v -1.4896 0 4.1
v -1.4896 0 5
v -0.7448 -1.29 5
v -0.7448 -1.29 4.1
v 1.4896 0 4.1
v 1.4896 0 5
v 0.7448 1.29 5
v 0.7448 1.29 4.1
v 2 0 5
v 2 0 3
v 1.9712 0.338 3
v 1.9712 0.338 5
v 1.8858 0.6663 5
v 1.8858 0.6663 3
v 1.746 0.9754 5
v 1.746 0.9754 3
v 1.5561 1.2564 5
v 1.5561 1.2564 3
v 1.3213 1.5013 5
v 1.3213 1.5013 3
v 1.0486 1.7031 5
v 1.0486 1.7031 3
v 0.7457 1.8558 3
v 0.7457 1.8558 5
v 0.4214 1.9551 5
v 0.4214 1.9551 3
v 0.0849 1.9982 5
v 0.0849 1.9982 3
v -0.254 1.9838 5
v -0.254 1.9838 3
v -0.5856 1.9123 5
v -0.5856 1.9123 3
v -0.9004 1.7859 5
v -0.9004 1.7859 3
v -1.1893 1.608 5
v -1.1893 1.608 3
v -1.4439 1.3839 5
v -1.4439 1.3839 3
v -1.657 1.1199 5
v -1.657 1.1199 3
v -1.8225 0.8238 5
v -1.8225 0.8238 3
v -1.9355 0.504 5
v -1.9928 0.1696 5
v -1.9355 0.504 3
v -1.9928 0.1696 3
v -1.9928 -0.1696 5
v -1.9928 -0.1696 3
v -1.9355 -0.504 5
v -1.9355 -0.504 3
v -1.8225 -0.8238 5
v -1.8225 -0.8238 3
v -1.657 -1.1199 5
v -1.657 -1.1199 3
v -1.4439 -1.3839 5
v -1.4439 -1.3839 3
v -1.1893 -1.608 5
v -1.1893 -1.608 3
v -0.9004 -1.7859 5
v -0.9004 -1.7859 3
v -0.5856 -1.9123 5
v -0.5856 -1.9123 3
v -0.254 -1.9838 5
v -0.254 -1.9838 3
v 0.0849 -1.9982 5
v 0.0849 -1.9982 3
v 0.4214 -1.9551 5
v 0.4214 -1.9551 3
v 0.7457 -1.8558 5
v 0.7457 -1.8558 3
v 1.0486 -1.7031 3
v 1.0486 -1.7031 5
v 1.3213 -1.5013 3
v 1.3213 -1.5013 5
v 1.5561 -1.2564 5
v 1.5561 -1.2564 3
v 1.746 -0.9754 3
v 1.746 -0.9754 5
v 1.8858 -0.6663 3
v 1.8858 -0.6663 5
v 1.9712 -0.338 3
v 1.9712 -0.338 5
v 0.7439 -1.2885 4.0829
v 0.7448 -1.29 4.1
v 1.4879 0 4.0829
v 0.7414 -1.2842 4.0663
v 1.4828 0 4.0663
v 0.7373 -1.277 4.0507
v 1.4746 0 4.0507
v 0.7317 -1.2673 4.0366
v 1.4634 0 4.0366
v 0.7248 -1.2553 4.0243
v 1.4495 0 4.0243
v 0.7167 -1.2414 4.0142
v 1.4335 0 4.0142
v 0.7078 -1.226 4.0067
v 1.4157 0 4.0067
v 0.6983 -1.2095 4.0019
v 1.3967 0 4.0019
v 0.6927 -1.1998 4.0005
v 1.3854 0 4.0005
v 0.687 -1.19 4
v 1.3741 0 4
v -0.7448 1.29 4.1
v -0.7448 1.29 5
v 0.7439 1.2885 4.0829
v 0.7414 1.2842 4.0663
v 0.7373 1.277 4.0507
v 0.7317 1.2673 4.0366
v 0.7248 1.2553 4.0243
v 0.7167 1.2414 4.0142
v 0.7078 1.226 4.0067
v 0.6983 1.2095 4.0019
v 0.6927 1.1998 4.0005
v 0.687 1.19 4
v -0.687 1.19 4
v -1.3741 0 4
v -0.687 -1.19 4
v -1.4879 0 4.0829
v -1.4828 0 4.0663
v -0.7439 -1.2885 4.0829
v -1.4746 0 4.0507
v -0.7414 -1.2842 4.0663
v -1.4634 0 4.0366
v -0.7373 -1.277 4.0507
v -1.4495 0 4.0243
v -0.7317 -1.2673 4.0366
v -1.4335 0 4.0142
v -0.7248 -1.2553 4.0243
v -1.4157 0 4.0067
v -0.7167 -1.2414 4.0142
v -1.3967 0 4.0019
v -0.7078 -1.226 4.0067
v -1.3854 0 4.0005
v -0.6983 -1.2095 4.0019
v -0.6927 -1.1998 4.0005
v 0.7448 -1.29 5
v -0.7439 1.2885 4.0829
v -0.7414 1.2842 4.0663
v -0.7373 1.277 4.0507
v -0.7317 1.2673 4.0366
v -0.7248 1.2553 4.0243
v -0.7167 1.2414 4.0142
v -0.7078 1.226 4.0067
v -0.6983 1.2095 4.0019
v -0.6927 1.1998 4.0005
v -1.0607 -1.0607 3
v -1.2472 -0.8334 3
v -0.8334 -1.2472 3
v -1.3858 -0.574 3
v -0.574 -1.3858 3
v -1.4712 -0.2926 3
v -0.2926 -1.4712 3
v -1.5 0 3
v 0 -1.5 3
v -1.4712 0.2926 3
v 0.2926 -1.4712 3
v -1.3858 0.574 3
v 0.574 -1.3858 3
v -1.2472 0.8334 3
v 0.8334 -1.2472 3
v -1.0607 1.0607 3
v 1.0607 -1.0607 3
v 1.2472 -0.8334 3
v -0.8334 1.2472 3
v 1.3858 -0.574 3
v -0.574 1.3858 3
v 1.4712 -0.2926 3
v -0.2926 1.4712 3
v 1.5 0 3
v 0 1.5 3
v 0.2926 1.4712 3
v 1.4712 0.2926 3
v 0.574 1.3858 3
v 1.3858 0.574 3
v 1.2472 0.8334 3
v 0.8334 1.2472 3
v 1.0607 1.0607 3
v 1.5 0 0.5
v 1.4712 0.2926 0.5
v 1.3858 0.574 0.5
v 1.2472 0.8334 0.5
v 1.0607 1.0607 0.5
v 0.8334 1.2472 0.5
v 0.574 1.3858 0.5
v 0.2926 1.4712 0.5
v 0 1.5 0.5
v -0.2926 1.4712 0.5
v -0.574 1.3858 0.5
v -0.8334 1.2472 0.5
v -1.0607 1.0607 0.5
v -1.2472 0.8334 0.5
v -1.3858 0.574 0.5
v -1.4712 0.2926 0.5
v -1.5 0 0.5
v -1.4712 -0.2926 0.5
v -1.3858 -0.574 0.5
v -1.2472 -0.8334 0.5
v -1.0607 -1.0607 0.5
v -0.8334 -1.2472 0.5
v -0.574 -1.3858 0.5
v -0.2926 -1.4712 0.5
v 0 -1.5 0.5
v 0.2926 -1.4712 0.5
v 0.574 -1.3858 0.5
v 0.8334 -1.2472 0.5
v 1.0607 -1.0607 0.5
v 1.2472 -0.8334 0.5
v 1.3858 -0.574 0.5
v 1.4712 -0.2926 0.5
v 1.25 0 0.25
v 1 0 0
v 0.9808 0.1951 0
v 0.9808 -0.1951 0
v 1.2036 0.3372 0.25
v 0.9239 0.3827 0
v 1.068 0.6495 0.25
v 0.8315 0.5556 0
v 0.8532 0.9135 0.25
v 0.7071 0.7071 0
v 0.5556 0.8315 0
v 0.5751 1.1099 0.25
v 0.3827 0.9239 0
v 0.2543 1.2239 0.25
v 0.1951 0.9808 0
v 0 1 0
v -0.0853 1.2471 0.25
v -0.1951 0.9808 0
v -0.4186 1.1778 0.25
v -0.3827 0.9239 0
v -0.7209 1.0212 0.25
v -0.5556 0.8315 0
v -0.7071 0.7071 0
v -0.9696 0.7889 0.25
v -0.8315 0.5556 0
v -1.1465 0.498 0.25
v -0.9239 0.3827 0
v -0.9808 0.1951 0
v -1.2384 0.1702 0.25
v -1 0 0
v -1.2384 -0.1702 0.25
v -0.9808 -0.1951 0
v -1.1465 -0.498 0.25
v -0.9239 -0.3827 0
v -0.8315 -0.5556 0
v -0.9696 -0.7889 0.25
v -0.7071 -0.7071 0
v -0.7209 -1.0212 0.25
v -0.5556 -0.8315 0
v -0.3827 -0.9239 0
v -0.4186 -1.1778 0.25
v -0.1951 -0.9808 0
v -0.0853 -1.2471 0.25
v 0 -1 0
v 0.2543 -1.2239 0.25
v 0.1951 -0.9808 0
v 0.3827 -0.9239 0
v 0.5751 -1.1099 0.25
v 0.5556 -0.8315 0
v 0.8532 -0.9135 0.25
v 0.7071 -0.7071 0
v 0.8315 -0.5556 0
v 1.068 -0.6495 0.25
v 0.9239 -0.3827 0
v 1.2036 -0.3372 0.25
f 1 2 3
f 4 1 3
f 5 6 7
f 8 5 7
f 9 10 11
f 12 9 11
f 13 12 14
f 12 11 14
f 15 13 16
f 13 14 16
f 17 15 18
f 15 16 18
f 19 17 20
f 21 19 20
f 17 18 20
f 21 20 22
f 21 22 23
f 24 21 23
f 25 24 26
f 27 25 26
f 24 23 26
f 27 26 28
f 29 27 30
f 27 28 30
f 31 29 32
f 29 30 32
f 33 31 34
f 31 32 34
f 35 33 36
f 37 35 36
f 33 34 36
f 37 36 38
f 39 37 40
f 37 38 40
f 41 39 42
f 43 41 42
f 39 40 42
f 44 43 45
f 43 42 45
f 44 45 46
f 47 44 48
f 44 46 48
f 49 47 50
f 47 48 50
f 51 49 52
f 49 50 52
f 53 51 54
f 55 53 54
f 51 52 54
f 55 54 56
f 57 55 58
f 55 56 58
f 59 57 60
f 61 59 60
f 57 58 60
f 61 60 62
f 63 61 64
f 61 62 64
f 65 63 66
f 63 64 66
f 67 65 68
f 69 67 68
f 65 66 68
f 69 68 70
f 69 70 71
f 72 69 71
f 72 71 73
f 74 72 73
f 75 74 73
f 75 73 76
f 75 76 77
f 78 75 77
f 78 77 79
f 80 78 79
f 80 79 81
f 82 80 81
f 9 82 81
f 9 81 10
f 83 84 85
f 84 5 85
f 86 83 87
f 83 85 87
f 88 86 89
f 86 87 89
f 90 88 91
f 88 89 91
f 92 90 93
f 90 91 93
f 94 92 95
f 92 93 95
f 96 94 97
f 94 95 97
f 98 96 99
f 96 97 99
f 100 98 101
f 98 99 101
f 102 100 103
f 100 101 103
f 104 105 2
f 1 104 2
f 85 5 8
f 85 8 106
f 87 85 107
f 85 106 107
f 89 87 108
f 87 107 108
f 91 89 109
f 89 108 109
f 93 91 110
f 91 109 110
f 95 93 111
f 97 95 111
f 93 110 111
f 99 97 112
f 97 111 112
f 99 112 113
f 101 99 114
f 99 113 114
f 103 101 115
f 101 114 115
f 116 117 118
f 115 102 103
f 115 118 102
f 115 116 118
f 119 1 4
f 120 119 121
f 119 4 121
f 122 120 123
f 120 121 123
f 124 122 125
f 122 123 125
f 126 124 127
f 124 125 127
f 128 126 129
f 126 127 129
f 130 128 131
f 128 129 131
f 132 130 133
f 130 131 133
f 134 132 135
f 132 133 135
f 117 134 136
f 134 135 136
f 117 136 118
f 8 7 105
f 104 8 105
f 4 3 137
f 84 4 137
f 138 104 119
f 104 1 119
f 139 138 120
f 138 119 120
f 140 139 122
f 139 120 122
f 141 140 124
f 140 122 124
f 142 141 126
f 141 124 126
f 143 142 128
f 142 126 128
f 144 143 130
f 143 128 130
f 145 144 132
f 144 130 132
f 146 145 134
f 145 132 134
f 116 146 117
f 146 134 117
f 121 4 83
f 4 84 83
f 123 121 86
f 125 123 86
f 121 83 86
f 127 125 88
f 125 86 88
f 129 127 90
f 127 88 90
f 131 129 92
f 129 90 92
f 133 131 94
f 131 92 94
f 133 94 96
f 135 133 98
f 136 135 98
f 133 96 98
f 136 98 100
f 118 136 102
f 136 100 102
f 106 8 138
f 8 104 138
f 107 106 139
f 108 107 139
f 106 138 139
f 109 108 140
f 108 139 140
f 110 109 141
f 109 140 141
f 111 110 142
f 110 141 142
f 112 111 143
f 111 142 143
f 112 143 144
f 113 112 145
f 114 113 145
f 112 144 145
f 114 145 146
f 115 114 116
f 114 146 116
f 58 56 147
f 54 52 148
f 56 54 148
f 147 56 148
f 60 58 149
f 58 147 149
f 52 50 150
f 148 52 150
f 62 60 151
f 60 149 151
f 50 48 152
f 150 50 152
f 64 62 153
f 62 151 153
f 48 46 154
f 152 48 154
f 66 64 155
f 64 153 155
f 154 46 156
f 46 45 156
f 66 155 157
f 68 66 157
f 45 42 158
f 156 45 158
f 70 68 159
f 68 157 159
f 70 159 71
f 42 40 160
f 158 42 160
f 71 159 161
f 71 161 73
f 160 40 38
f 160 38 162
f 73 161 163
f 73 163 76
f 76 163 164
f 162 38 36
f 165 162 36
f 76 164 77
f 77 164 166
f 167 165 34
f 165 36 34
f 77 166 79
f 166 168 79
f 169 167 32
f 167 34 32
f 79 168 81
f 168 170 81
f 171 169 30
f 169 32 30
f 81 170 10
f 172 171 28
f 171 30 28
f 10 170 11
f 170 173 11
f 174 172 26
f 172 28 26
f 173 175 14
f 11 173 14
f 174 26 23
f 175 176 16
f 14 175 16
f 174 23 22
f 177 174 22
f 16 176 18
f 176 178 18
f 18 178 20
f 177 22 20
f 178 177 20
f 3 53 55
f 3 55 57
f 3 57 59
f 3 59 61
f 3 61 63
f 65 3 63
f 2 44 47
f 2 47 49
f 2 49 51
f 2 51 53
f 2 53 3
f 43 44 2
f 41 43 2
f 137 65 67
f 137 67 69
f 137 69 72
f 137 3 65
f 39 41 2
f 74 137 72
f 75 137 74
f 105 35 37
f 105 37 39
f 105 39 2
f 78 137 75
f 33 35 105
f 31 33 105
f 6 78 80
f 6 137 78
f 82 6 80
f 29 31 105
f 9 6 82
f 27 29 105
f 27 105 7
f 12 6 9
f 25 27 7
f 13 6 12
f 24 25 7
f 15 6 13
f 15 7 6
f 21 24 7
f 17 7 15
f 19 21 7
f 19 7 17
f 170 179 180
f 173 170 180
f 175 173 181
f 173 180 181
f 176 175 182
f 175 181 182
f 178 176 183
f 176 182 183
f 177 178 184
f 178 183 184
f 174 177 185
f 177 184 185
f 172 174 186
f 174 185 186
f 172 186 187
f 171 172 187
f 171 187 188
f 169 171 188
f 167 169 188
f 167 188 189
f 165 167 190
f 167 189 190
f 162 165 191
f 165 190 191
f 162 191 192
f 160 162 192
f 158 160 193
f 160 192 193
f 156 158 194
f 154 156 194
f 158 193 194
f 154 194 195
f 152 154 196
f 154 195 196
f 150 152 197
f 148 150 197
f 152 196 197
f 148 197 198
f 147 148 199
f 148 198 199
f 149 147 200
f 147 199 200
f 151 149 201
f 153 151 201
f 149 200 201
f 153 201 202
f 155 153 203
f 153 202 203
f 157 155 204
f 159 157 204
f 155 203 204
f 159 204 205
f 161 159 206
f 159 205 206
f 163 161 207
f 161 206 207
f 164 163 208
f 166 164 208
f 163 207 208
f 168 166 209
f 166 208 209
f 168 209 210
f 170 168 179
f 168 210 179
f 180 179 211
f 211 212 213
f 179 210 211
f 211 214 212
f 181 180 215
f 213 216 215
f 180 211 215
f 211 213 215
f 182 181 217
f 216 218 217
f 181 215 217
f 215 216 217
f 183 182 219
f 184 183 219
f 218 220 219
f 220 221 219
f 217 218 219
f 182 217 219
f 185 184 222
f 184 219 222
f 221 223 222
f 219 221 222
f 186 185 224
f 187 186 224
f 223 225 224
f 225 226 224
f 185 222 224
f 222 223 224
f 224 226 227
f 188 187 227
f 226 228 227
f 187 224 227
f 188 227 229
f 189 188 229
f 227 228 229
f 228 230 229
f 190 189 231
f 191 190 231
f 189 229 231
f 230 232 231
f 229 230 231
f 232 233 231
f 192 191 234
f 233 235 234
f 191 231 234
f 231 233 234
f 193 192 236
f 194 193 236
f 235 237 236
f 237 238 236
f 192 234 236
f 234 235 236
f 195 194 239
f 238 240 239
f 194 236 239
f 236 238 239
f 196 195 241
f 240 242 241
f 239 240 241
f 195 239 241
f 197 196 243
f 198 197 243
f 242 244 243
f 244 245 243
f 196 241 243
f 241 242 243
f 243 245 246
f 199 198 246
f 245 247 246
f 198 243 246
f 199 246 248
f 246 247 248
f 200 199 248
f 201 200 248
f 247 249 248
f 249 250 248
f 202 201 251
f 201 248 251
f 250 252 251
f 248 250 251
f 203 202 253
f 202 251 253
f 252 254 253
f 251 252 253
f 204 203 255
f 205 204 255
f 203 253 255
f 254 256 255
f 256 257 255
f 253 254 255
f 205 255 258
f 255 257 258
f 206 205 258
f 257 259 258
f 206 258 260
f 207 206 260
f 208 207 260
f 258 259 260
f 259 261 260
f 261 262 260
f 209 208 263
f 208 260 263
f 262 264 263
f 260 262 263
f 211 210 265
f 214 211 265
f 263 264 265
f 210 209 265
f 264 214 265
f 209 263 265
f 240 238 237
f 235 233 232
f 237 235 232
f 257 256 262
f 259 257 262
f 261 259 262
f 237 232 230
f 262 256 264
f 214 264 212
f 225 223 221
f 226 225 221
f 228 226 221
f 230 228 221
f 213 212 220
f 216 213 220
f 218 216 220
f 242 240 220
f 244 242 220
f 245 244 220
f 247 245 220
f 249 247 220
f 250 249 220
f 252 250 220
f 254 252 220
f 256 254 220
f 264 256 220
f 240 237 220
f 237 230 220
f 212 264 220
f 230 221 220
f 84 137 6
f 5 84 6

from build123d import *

# Parameters (mm, degrees)
SKETCH3_R           = 1.5
BOSS_EXTRUDE1_DEPTH = 3
SKETCH4_R           = 2
BOSS_EXTRUDE2_DEPTH = 2
CUT_EXTRUDE1_DEPTH  = 1
CHAMFER3_SIZE       = 0.5
FILLET1_R           = 0.1


with BuildPart() as part:
    # Sketch3 → Boss-Extrude1 (new body)
    with BuildSketch(Plane(origin=(0, 0, 0), x_dir=(0, 1, 0), z_dir=(0, 0, 1))):
        with Locations(Location((0, 0, 0), (0, 0, 270))):
            Circle(SKETCH3_R)
    extrude(amount=BOSS_EXTRUDE1_DEPTH)

    # Sketch4 → Boss-Extrude2 (add)
    with BuildSketch(Plane.XY.offset(3)):
        Circle(SKETCH4_R)
    extrude(amount=BOSS_EXTRUDE2_DEPTH)

    # Sketch5 → Cut-Extrude1 (cut)
    with BuildSketch(Plane.XY.offset(5)):
        Polygon((1.489563695, 0), (0.744781847, 1.29), (-0.744781847, 1.29), (-1.489563695, 0), (-0.744781847, -1.29), (0.744781847, -1.29), align=None)
    extrude(amount=-CUT_EXTRUDE1_DEPTH, mode=Mode.SUBTRACT)

    # Chamfer3
    chamfer3_edges = [part.edges().sort_by_distance(p)[0] for p in [
        (-1.5, 0, 0),
    ]]
    chamfer(chamfer3_edges, length=CHAMFER3_SIZE)

    # Fillet1
    fillet1_edges = [part.edges().sort_by_distance(p)[0] for p in [
        (1.117172771, -0.645, 4),
        (0, -1.29, 4),
        (-1.117172771, -0.645, 4),
        (-1.117172771, 0.645, 4),
        (0, 1.29, 4),
        (1.117172771, 0.645, 4),
    ]]
    fillet(fillet1_edges, radius=FILLET1_R)


solid = part.part
